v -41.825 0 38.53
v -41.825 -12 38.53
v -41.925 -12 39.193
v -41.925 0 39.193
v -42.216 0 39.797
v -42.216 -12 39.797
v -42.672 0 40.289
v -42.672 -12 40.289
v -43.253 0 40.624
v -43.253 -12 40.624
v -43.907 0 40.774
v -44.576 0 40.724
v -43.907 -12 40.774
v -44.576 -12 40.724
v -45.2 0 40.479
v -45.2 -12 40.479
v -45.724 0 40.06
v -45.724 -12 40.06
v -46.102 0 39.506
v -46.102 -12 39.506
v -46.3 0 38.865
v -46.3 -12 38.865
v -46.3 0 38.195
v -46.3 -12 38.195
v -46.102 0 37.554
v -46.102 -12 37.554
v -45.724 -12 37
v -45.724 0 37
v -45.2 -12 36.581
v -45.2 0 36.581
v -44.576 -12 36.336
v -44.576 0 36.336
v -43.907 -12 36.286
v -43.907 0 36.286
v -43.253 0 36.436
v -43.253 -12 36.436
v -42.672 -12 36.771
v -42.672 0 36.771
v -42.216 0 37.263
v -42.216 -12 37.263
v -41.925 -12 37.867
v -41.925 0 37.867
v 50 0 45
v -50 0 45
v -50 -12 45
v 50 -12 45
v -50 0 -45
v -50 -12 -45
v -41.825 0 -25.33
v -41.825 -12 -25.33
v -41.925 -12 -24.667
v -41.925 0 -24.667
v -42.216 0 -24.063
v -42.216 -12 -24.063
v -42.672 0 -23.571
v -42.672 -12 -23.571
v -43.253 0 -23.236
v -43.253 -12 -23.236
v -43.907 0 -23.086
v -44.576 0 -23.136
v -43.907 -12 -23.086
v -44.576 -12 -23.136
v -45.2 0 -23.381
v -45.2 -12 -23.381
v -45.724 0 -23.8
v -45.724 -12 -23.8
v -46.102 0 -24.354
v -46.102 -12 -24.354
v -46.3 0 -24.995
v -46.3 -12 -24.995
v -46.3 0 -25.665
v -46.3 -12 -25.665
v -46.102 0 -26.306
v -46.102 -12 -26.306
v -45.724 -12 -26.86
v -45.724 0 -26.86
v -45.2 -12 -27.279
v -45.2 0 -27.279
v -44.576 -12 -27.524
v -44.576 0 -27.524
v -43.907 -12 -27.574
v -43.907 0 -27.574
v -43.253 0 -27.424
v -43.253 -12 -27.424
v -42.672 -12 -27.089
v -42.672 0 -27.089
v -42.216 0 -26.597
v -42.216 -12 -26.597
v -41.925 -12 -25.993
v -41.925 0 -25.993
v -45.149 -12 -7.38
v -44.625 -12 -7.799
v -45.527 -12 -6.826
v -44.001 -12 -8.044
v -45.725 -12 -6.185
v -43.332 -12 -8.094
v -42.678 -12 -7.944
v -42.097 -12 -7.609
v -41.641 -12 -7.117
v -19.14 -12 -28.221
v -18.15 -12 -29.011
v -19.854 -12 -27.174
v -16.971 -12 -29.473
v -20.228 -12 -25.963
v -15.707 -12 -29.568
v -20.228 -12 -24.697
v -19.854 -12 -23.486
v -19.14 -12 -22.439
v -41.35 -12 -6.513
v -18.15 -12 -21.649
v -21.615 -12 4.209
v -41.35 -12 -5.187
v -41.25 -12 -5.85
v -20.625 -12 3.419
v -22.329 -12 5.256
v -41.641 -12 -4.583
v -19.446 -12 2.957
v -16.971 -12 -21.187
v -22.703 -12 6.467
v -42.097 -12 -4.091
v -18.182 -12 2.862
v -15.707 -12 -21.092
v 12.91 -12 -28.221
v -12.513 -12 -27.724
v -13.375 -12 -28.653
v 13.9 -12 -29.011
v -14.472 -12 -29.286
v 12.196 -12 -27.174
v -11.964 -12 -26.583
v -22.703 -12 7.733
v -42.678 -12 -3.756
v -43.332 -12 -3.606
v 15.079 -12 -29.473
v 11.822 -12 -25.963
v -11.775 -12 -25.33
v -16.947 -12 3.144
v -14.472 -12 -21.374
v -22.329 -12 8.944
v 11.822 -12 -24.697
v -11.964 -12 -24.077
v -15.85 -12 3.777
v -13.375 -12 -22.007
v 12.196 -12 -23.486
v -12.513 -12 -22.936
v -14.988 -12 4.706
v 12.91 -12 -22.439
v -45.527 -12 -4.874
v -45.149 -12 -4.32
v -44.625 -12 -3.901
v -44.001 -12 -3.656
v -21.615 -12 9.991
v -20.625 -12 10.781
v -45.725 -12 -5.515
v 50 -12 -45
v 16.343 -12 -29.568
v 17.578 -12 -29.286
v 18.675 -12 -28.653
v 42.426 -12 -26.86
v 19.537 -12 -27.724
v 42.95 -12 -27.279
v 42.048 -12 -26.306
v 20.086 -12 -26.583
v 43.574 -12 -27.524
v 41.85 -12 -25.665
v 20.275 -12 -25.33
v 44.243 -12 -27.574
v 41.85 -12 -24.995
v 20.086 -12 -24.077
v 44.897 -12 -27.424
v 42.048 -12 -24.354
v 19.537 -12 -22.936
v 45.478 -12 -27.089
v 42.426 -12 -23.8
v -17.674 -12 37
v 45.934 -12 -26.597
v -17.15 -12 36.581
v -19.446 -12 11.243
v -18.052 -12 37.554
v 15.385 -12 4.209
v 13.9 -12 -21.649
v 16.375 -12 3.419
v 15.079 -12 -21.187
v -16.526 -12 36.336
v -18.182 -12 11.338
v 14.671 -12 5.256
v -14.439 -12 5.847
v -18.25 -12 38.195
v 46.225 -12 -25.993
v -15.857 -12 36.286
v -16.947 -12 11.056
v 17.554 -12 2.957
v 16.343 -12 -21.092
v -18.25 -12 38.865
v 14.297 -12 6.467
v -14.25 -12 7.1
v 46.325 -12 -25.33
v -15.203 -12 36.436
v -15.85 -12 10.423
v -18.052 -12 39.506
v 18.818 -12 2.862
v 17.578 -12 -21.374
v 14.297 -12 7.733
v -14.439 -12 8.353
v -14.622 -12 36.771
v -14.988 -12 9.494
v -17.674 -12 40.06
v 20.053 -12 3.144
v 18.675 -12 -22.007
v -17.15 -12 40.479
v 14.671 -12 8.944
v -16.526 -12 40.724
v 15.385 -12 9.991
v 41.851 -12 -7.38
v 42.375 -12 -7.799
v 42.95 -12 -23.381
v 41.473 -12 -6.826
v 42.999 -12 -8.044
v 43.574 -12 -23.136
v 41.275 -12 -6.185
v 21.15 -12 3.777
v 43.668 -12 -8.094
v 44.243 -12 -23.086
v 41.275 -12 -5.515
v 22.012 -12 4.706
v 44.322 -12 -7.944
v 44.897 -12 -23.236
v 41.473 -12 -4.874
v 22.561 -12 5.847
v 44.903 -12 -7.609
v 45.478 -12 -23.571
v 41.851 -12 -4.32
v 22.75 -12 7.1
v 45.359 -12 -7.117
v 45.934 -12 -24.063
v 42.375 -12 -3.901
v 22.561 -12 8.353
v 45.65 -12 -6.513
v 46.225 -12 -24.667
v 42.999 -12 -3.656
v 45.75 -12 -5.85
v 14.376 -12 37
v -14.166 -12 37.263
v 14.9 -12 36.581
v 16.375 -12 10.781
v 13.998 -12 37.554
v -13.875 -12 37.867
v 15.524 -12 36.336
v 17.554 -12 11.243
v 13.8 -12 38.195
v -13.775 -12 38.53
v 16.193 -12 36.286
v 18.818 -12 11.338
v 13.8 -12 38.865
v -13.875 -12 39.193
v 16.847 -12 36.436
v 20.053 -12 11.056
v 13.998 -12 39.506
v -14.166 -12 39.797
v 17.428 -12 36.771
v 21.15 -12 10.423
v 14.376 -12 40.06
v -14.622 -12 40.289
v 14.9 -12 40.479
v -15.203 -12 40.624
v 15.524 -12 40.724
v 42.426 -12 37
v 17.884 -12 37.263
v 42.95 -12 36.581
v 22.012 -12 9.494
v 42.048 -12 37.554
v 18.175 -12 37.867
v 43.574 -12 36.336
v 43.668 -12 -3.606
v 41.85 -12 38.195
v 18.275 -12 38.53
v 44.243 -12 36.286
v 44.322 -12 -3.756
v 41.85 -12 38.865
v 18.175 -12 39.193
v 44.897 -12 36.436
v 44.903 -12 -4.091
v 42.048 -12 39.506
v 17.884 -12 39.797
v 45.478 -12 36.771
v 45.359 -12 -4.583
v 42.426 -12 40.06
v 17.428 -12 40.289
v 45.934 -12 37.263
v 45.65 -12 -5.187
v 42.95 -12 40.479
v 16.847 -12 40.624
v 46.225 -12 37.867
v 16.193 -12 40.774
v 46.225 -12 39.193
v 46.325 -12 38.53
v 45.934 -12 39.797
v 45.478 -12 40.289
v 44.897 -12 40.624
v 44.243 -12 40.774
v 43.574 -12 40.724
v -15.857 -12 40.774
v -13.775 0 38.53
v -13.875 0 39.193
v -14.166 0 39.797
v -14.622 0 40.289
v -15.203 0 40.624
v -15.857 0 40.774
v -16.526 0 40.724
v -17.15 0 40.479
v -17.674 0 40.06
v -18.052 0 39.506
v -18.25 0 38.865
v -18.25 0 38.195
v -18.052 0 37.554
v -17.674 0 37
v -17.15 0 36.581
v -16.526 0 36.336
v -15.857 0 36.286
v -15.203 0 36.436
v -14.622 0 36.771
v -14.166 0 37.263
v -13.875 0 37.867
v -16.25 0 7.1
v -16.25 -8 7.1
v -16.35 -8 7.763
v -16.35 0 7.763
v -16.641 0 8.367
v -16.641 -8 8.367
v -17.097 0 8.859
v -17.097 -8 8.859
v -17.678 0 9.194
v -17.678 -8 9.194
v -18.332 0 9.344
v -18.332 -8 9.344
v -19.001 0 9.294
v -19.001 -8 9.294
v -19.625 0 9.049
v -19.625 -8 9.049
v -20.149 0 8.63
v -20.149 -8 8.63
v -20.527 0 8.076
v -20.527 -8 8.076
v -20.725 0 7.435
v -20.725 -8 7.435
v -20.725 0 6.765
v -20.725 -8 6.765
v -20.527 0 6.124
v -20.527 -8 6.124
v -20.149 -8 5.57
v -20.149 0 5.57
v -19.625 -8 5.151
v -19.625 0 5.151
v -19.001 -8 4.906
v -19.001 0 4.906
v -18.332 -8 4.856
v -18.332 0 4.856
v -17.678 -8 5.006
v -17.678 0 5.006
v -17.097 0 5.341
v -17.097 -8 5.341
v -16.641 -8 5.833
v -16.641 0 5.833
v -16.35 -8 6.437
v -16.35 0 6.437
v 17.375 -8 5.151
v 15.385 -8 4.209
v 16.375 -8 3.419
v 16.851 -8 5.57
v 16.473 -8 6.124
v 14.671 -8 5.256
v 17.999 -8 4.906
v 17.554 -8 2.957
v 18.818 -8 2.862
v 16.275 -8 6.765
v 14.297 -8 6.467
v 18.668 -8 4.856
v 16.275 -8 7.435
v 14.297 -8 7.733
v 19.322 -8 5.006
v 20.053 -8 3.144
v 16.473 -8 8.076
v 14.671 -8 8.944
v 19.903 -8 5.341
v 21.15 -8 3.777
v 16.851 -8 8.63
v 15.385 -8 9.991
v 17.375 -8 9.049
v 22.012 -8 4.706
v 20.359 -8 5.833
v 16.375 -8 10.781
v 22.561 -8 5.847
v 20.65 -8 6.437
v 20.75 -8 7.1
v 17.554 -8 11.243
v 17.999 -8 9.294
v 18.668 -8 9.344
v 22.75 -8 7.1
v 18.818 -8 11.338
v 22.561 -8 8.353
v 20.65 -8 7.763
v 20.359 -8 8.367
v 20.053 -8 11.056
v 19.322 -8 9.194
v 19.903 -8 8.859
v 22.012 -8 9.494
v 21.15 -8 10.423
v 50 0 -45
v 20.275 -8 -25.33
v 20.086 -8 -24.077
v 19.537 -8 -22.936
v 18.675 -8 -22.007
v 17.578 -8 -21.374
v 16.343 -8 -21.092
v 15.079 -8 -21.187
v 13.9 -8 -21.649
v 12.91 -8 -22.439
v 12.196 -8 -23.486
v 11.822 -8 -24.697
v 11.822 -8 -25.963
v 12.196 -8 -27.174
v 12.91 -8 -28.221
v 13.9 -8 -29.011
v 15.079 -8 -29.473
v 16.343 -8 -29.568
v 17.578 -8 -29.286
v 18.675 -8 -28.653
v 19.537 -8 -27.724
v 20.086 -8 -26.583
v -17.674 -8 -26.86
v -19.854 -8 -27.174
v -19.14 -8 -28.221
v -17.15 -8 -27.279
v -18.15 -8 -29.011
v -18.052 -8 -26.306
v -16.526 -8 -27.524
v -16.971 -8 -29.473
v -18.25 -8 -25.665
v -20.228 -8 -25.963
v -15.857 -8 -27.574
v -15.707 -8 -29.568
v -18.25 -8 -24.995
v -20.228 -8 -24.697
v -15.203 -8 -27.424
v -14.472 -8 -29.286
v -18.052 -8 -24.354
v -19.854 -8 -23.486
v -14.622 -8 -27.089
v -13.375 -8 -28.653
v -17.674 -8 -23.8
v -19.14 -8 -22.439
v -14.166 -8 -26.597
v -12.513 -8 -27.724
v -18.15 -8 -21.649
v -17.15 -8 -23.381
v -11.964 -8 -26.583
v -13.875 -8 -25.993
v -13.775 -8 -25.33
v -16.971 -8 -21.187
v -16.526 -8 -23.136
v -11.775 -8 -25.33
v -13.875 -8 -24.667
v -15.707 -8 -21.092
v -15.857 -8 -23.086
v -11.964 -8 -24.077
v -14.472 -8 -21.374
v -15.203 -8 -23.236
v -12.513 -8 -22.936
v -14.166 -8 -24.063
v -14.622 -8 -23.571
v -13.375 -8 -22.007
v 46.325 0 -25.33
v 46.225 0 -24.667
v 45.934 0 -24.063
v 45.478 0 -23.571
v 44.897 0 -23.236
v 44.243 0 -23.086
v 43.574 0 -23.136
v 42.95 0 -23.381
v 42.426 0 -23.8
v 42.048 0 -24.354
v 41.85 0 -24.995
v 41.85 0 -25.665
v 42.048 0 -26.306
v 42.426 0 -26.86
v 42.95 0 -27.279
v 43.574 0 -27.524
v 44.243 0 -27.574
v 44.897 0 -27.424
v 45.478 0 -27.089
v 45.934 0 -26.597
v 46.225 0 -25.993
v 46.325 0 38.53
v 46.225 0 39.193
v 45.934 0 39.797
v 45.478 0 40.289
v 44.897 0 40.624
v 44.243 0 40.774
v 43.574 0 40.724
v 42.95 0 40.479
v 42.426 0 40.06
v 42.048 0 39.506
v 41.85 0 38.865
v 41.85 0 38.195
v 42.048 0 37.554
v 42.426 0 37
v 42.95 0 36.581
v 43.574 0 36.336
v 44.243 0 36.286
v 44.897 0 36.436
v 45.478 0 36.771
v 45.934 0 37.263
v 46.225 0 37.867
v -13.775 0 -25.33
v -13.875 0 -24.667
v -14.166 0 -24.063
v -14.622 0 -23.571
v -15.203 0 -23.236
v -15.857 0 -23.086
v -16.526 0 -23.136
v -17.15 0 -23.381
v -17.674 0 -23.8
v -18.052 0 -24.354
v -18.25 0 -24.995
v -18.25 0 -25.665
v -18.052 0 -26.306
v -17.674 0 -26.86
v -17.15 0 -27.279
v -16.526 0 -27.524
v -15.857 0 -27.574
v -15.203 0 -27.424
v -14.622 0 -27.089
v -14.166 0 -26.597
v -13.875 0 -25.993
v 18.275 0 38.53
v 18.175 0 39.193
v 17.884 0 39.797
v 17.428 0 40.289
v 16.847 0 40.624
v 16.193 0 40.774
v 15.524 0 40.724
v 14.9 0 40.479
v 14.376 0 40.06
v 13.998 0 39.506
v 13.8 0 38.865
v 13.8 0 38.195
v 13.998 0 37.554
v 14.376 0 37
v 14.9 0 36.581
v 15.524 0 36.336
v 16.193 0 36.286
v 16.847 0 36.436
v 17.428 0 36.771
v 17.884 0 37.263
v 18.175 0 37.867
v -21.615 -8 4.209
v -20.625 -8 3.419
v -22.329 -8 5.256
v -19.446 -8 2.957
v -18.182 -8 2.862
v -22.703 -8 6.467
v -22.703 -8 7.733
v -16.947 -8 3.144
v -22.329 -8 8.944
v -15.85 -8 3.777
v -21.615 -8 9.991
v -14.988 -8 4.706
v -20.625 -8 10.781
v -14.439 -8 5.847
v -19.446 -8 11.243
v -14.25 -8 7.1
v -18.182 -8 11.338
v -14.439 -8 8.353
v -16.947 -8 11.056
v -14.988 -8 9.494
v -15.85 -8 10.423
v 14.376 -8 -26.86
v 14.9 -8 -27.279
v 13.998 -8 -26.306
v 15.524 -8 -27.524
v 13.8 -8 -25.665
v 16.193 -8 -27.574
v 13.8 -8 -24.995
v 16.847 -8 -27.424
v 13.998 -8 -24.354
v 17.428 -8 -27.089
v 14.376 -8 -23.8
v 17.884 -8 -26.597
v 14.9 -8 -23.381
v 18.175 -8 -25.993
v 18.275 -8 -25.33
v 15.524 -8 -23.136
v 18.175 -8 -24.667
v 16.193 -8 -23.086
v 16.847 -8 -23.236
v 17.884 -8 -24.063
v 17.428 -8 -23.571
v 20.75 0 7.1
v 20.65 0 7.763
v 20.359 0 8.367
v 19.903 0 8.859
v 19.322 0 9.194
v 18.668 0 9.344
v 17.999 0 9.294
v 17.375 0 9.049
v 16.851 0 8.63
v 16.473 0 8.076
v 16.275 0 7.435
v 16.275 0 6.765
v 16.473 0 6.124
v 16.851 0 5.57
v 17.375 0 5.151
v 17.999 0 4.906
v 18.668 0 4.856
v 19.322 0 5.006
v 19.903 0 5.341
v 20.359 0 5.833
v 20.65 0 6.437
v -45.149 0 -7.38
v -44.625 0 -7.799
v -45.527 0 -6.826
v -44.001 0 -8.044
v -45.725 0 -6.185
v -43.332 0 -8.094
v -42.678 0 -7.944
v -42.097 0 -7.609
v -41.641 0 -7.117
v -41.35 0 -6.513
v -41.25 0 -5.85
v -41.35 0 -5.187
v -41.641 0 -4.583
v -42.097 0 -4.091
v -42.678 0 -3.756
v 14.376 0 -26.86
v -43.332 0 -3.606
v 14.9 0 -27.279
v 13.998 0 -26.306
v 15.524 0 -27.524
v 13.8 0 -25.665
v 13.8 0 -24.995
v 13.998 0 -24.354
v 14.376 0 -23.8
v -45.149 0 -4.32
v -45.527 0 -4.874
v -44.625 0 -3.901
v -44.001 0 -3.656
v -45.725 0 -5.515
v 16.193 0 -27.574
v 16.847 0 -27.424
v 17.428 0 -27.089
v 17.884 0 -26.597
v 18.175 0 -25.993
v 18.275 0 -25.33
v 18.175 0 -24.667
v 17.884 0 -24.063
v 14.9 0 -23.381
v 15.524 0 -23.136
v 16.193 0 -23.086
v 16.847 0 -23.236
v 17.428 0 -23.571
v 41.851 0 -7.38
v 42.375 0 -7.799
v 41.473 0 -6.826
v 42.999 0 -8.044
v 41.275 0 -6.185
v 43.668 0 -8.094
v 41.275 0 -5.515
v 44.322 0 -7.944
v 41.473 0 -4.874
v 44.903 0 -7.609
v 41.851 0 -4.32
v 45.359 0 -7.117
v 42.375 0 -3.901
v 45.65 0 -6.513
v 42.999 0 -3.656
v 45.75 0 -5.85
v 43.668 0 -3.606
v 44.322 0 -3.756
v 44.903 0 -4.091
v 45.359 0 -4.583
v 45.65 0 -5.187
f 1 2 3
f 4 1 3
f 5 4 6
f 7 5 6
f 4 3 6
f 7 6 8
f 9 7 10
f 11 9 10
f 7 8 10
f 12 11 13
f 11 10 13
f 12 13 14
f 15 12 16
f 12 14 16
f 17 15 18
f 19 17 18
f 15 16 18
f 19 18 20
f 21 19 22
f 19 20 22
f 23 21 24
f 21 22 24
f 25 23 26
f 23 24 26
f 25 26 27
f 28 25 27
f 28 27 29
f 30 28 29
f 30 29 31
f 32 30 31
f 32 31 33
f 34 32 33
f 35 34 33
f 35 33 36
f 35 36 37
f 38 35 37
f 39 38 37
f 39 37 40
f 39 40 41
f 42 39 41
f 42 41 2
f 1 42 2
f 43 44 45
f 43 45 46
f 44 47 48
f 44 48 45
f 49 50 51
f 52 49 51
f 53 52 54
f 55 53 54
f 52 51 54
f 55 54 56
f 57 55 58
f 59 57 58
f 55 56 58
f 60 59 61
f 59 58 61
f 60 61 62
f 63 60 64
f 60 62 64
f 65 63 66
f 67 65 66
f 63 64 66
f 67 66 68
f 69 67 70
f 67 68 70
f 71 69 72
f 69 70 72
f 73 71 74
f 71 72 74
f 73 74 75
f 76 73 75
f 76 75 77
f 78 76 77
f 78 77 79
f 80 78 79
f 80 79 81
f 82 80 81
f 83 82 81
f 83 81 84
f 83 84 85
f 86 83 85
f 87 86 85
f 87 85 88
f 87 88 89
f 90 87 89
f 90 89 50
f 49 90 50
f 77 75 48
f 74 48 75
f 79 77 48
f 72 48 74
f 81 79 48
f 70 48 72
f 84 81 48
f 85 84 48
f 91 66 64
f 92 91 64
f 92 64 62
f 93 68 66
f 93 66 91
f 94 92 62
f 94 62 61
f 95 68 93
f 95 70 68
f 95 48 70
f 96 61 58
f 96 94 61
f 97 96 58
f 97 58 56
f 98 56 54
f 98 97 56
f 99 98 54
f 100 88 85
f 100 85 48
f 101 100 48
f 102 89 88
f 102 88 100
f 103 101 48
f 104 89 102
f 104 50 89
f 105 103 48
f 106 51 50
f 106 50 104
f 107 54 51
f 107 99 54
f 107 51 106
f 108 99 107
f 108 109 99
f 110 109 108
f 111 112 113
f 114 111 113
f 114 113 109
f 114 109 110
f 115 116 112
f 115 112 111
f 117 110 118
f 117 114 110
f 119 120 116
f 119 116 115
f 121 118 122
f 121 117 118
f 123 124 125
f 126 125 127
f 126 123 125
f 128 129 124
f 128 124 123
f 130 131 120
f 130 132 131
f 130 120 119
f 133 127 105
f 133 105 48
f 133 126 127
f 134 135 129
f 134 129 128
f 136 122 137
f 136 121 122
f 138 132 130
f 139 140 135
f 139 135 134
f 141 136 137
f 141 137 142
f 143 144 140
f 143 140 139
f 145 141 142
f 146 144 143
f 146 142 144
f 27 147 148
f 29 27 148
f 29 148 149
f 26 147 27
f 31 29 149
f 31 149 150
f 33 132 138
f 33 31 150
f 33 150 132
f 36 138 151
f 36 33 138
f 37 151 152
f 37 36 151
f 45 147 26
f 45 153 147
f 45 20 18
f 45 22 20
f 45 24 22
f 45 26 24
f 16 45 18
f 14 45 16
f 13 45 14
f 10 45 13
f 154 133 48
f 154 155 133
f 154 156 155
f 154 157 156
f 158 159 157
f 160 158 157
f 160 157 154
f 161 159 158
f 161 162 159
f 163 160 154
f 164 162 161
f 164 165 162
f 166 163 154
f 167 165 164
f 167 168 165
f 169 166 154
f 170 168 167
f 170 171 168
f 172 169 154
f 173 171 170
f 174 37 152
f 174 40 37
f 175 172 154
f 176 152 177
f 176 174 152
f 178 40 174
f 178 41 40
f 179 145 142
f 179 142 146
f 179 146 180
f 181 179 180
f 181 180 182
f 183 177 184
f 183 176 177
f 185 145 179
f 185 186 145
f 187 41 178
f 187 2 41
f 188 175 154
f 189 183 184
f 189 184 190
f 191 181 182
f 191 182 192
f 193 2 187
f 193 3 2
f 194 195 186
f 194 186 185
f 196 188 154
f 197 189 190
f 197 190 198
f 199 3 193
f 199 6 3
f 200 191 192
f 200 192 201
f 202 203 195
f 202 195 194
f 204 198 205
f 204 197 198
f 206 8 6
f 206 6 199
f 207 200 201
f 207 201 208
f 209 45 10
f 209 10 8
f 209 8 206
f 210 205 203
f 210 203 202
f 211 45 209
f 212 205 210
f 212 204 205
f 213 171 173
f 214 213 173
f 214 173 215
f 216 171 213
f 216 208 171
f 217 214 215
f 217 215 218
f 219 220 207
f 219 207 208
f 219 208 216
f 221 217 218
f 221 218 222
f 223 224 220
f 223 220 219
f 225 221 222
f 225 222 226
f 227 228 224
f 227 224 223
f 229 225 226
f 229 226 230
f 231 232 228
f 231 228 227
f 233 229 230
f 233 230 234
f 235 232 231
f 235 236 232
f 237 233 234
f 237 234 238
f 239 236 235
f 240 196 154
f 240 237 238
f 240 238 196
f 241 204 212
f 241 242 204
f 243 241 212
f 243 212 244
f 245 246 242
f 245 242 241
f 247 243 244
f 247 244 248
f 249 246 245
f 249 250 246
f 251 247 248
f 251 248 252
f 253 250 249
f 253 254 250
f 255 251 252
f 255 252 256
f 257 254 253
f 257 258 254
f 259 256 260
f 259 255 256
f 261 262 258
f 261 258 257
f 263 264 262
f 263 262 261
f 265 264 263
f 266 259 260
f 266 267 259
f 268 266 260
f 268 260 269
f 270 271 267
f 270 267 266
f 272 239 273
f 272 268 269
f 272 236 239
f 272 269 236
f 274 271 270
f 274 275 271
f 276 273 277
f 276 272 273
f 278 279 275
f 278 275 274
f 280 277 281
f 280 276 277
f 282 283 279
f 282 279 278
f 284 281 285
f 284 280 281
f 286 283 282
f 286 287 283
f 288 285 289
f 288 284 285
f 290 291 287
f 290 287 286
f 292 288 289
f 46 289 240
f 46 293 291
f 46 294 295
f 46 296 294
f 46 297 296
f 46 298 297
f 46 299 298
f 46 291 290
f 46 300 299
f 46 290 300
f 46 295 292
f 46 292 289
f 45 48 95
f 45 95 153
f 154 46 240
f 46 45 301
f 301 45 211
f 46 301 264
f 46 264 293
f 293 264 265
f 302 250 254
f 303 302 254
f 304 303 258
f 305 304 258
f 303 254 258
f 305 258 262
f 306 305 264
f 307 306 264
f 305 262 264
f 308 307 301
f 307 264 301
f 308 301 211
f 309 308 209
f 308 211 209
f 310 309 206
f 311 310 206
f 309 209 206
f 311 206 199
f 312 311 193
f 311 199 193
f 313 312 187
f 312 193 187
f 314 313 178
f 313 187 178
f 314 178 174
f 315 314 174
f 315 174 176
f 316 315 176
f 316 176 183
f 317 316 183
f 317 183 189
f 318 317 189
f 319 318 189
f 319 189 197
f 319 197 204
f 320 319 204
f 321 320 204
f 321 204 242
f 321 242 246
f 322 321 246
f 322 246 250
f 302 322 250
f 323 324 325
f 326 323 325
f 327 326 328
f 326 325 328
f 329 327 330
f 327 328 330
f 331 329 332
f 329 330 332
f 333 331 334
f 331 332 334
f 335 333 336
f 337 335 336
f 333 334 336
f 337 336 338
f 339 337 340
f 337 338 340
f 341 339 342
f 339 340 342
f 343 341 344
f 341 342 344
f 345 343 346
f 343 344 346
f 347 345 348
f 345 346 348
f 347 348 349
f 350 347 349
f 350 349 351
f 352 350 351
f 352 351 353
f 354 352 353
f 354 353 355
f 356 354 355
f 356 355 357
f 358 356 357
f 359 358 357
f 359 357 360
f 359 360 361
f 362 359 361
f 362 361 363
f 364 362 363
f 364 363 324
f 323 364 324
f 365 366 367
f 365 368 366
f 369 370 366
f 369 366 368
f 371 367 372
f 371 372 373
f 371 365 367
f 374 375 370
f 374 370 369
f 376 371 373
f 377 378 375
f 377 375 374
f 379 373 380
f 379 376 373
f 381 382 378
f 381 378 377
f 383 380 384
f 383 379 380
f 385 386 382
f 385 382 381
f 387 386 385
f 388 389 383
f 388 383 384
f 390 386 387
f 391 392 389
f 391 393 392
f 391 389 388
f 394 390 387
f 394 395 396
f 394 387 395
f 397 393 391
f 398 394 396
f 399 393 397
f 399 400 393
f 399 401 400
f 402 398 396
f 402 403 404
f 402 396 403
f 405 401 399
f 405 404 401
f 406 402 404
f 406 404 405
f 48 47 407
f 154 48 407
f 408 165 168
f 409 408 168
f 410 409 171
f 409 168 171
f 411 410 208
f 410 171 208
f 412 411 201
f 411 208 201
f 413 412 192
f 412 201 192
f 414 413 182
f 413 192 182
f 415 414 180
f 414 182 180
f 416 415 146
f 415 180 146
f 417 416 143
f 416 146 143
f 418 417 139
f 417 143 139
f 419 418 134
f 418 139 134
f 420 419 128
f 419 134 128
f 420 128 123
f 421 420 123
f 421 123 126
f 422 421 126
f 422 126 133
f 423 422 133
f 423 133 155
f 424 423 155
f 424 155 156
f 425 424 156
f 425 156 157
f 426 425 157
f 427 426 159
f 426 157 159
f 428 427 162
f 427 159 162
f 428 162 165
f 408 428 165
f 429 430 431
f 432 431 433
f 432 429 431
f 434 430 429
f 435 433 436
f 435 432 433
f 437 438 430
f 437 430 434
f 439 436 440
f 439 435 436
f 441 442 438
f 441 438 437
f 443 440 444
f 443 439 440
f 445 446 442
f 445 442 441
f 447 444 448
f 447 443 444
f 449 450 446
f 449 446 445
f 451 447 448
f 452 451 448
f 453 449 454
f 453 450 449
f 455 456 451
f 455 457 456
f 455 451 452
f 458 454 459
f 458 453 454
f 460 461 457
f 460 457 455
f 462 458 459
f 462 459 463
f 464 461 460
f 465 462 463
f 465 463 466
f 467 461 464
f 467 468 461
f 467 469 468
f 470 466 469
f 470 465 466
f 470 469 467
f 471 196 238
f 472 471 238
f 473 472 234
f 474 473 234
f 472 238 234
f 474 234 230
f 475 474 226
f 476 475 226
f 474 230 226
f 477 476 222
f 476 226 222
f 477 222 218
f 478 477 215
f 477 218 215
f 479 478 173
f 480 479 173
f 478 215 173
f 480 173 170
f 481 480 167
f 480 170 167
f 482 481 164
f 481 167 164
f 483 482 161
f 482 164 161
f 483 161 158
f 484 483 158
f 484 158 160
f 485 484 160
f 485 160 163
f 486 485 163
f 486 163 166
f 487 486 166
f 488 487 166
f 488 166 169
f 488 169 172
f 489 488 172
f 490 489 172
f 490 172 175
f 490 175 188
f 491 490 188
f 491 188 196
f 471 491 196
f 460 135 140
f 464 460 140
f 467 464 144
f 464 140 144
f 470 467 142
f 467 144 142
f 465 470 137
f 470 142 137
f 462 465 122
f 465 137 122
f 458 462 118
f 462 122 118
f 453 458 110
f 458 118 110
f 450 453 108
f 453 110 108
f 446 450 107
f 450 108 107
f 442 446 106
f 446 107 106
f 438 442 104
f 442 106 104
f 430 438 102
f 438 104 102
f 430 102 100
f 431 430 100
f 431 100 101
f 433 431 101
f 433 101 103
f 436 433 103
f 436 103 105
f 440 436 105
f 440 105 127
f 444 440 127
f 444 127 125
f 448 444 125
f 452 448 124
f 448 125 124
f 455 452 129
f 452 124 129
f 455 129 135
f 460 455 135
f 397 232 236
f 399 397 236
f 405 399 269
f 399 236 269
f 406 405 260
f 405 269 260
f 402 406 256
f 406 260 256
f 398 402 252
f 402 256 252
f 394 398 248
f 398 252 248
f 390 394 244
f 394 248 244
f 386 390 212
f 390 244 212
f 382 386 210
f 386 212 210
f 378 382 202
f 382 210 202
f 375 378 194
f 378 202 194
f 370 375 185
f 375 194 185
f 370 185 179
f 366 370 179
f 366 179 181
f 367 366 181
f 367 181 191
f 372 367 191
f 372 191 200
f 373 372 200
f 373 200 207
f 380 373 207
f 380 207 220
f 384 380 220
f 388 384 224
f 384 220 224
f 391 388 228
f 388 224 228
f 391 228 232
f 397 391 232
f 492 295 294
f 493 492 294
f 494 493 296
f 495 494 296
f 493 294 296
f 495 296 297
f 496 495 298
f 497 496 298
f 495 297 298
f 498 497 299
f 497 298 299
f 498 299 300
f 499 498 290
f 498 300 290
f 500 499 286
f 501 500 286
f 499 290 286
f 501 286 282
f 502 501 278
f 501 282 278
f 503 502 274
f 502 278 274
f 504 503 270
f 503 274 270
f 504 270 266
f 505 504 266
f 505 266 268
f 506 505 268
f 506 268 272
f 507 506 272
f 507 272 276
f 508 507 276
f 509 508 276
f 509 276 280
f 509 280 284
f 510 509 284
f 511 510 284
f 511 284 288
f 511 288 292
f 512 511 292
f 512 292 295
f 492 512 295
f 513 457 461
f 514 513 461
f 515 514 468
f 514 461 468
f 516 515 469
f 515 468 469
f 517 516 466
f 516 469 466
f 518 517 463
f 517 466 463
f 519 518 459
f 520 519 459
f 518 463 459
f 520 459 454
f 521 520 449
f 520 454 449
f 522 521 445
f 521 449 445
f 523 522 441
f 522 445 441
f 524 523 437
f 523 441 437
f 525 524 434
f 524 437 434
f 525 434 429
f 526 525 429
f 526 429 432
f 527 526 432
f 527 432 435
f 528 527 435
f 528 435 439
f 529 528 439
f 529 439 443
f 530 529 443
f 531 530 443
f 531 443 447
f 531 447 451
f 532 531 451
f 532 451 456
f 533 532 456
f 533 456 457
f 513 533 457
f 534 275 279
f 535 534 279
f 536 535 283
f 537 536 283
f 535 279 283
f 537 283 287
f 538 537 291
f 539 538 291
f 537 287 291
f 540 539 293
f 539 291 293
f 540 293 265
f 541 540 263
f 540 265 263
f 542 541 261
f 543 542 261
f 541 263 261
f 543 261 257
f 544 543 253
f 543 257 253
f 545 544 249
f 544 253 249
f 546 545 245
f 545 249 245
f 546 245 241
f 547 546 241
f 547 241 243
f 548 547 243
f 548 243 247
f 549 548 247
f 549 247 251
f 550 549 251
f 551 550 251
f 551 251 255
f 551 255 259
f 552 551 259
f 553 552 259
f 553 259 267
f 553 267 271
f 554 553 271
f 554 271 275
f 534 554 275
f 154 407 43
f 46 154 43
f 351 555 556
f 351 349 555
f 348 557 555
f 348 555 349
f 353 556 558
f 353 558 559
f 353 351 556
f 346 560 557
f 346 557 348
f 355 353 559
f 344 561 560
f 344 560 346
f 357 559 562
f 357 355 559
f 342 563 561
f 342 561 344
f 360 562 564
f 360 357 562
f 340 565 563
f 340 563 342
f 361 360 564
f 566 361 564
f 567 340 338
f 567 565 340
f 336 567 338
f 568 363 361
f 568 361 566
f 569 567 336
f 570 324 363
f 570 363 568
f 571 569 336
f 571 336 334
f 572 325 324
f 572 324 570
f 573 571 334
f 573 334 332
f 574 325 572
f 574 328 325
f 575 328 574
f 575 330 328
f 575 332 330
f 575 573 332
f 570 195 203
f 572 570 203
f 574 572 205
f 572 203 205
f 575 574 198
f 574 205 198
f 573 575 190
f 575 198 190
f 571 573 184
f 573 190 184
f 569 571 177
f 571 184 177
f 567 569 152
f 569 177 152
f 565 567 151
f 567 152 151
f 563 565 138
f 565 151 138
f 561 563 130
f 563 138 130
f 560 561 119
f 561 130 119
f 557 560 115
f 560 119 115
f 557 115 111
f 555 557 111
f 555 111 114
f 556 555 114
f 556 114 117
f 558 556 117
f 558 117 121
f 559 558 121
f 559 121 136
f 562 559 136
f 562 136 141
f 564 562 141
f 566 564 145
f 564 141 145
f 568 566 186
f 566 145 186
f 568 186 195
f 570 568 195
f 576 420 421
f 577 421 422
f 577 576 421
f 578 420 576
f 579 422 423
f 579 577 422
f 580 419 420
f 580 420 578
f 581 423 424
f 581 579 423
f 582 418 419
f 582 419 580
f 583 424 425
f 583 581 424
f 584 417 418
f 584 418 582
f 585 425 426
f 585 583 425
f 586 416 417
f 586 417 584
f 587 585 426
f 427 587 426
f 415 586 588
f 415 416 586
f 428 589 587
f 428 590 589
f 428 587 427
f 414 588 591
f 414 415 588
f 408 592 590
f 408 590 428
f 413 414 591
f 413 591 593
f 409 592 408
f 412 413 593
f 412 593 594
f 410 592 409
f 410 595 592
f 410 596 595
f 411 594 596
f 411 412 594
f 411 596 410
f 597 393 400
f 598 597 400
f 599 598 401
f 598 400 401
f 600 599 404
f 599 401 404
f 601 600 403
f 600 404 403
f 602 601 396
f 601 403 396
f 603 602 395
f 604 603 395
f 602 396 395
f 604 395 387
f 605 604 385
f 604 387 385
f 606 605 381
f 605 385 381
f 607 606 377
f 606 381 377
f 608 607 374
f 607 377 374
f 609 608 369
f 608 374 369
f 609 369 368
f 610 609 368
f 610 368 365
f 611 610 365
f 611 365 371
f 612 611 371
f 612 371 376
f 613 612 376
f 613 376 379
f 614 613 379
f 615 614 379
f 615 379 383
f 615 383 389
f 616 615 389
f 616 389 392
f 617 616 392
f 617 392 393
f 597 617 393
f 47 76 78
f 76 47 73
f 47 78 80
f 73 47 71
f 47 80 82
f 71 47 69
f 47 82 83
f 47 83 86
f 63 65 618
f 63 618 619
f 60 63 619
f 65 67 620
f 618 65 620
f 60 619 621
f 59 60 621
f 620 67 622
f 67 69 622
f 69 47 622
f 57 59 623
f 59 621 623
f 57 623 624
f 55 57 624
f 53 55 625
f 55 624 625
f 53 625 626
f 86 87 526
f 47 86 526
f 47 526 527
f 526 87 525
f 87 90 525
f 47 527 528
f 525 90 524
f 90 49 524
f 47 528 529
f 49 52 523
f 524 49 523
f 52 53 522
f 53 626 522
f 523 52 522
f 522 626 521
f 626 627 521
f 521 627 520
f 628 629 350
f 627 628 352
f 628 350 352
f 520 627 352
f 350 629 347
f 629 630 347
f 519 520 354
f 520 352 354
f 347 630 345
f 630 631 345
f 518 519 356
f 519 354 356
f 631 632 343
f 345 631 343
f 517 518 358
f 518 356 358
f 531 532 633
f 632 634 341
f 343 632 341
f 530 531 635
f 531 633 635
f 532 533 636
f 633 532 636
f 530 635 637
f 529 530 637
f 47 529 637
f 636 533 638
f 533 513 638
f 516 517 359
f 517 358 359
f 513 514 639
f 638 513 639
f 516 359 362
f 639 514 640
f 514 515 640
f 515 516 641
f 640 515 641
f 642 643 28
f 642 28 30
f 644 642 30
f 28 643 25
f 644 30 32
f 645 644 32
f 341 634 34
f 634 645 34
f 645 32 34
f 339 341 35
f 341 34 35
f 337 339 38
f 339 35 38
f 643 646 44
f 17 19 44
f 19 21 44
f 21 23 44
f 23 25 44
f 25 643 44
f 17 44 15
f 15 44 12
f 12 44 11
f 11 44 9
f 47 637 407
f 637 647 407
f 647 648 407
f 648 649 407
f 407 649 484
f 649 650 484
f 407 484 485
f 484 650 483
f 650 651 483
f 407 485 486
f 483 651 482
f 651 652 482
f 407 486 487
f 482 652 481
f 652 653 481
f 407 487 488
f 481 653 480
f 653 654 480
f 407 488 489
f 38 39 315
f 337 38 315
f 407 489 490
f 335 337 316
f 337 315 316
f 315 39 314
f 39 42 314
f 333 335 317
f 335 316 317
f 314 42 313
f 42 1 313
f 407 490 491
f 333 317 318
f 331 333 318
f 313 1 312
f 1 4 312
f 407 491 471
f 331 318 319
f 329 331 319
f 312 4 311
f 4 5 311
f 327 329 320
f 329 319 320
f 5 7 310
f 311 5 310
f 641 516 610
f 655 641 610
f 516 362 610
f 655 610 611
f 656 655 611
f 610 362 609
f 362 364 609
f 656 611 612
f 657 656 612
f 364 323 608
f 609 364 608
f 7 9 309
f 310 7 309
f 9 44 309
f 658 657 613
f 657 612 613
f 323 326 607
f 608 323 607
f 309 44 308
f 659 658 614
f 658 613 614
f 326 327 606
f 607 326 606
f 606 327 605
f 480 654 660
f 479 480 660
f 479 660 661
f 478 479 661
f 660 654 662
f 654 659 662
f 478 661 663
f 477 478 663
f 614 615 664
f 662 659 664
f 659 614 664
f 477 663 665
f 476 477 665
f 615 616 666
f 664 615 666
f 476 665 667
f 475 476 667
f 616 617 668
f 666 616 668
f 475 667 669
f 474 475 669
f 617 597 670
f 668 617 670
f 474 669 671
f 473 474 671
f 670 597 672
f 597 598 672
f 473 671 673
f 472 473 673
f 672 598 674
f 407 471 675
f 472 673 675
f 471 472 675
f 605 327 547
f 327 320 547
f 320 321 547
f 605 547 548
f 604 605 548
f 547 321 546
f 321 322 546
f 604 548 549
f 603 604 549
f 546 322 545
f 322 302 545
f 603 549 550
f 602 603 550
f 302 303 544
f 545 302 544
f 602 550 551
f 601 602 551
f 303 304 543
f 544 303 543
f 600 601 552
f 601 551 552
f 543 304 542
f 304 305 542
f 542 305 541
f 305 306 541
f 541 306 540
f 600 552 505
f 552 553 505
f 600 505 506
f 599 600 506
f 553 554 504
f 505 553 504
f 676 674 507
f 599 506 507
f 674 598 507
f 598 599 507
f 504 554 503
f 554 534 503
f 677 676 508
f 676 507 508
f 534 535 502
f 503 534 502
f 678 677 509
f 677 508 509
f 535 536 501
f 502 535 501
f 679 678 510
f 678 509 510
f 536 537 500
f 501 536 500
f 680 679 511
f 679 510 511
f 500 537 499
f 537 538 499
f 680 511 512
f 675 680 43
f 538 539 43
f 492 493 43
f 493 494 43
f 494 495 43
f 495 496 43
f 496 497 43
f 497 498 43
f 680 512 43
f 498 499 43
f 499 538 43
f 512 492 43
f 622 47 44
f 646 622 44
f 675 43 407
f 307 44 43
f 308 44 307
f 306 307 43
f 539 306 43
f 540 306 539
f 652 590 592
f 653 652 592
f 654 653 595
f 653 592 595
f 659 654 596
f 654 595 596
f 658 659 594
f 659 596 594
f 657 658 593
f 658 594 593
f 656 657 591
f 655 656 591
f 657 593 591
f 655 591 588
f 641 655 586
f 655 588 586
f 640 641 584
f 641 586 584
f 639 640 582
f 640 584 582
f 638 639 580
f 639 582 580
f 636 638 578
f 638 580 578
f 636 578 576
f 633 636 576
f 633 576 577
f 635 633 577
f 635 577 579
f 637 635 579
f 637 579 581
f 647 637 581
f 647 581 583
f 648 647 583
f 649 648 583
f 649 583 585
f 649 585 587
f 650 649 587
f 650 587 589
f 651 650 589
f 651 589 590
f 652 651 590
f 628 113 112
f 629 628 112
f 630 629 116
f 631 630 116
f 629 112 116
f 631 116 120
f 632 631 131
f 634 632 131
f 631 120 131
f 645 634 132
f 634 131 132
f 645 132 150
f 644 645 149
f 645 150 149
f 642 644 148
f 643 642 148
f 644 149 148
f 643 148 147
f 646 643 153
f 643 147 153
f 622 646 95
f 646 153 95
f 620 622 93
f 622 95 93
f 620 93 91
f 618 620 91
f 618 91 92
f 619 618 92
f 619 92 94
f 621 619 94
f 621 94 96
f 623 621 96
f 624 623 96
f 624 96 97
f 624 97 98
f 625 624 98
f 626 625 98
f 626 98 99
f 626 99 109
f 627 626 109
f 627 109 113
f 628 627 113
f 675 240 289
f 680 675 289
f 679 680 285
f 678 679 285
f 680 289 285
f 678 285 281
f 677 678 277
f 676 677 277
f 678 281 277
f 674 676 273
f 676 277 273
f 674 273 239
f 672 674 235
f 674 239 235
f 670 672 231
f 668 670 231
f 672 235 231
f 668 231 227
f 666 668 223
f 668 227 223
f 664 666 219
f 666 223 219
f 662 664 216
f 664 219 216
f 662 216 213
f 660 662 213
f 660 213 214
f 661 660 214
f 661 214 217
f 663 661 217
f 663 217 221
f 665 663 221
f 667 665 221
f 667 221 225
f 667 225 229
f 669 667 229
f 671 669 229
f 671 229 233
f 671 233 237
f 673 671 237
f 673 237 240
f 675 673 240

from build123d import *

# Parameters (mm, degrees)
SKETCH_W        = 100
SKETCH_H        = 90
PAD_DEPTH       = 12
SKETCH001_R     = 2.25
POCKET_DEPTH    = 12.001
SKETCH002_R     = 4.25
POCKET001_DEPTH = 4


with BuildPart() as part:
    # Sketch → Pad (new body)
    with BuildSketch(Plane.XZ):
        Rectangle(SKETCH_W, SKETCH_H)
    extrude(amount=PAD_DEPTH)

    # Sketch001 → Pocket (cut, through all)
    with BuildSketch(Plane.XZ.offset(12)):
        with Locations((-44.075, -25.33)):
            Circle(SKETCH001_R)
        with Locations((-43.5, -5.85)):
            Circle(SKETCH001_R)
        with Locations((-16.025, -25.33)):
            Circle(SKETCH001_R)
        with Locations((16.025, -25.33)):
            Circle(SKETCH001_R)
        with Locations((44.075, -25.33)):
            Circle(SKETCH001_R)
        with Locations((43.5, -5.85)):
            Circle(SKETCH001_R)
        with Locations((-44.075, 38.53)):
            Circle(SKETCH001_R)
        with Locations((-16.025, 38.53)):
            Circle(SKETCH001_R)
        with Locations((16.025, 38.53)):
            Circle(SKETCH001_R)
        with Locations((44.075, 38.53)):
            Circle(SKETCH001_R)
        with Locations((-18.5, 7.1)):
            Circle(SKETCH001_R)
        with Locations((18.5, 7.1)):
            Circle(SKETCH001_R)
    extrude(amount=-POCKET_DEPTH, mode=Mode.SUBTRACT)

    # Sketch002 → Pocket001 (cut)
    with BuildSketch(Plane.XZ.offset(12)):
        with Locations((-16.025, -25.33)):
            Circle(SKETCH002_R)
        with Locations((16.025, -25.33)):
            Circle(SKETCH002_R)
        with Locations((-18.5, 7.1)):
            Circle(SKETCH002_R)
        with Locations((18.5, 7.1)):
            Circle(SKETCH002_R)
    extrude(amount=-POCKET001_DEPTH, mode=Mode.SUBTRACT)


solid = part.part
